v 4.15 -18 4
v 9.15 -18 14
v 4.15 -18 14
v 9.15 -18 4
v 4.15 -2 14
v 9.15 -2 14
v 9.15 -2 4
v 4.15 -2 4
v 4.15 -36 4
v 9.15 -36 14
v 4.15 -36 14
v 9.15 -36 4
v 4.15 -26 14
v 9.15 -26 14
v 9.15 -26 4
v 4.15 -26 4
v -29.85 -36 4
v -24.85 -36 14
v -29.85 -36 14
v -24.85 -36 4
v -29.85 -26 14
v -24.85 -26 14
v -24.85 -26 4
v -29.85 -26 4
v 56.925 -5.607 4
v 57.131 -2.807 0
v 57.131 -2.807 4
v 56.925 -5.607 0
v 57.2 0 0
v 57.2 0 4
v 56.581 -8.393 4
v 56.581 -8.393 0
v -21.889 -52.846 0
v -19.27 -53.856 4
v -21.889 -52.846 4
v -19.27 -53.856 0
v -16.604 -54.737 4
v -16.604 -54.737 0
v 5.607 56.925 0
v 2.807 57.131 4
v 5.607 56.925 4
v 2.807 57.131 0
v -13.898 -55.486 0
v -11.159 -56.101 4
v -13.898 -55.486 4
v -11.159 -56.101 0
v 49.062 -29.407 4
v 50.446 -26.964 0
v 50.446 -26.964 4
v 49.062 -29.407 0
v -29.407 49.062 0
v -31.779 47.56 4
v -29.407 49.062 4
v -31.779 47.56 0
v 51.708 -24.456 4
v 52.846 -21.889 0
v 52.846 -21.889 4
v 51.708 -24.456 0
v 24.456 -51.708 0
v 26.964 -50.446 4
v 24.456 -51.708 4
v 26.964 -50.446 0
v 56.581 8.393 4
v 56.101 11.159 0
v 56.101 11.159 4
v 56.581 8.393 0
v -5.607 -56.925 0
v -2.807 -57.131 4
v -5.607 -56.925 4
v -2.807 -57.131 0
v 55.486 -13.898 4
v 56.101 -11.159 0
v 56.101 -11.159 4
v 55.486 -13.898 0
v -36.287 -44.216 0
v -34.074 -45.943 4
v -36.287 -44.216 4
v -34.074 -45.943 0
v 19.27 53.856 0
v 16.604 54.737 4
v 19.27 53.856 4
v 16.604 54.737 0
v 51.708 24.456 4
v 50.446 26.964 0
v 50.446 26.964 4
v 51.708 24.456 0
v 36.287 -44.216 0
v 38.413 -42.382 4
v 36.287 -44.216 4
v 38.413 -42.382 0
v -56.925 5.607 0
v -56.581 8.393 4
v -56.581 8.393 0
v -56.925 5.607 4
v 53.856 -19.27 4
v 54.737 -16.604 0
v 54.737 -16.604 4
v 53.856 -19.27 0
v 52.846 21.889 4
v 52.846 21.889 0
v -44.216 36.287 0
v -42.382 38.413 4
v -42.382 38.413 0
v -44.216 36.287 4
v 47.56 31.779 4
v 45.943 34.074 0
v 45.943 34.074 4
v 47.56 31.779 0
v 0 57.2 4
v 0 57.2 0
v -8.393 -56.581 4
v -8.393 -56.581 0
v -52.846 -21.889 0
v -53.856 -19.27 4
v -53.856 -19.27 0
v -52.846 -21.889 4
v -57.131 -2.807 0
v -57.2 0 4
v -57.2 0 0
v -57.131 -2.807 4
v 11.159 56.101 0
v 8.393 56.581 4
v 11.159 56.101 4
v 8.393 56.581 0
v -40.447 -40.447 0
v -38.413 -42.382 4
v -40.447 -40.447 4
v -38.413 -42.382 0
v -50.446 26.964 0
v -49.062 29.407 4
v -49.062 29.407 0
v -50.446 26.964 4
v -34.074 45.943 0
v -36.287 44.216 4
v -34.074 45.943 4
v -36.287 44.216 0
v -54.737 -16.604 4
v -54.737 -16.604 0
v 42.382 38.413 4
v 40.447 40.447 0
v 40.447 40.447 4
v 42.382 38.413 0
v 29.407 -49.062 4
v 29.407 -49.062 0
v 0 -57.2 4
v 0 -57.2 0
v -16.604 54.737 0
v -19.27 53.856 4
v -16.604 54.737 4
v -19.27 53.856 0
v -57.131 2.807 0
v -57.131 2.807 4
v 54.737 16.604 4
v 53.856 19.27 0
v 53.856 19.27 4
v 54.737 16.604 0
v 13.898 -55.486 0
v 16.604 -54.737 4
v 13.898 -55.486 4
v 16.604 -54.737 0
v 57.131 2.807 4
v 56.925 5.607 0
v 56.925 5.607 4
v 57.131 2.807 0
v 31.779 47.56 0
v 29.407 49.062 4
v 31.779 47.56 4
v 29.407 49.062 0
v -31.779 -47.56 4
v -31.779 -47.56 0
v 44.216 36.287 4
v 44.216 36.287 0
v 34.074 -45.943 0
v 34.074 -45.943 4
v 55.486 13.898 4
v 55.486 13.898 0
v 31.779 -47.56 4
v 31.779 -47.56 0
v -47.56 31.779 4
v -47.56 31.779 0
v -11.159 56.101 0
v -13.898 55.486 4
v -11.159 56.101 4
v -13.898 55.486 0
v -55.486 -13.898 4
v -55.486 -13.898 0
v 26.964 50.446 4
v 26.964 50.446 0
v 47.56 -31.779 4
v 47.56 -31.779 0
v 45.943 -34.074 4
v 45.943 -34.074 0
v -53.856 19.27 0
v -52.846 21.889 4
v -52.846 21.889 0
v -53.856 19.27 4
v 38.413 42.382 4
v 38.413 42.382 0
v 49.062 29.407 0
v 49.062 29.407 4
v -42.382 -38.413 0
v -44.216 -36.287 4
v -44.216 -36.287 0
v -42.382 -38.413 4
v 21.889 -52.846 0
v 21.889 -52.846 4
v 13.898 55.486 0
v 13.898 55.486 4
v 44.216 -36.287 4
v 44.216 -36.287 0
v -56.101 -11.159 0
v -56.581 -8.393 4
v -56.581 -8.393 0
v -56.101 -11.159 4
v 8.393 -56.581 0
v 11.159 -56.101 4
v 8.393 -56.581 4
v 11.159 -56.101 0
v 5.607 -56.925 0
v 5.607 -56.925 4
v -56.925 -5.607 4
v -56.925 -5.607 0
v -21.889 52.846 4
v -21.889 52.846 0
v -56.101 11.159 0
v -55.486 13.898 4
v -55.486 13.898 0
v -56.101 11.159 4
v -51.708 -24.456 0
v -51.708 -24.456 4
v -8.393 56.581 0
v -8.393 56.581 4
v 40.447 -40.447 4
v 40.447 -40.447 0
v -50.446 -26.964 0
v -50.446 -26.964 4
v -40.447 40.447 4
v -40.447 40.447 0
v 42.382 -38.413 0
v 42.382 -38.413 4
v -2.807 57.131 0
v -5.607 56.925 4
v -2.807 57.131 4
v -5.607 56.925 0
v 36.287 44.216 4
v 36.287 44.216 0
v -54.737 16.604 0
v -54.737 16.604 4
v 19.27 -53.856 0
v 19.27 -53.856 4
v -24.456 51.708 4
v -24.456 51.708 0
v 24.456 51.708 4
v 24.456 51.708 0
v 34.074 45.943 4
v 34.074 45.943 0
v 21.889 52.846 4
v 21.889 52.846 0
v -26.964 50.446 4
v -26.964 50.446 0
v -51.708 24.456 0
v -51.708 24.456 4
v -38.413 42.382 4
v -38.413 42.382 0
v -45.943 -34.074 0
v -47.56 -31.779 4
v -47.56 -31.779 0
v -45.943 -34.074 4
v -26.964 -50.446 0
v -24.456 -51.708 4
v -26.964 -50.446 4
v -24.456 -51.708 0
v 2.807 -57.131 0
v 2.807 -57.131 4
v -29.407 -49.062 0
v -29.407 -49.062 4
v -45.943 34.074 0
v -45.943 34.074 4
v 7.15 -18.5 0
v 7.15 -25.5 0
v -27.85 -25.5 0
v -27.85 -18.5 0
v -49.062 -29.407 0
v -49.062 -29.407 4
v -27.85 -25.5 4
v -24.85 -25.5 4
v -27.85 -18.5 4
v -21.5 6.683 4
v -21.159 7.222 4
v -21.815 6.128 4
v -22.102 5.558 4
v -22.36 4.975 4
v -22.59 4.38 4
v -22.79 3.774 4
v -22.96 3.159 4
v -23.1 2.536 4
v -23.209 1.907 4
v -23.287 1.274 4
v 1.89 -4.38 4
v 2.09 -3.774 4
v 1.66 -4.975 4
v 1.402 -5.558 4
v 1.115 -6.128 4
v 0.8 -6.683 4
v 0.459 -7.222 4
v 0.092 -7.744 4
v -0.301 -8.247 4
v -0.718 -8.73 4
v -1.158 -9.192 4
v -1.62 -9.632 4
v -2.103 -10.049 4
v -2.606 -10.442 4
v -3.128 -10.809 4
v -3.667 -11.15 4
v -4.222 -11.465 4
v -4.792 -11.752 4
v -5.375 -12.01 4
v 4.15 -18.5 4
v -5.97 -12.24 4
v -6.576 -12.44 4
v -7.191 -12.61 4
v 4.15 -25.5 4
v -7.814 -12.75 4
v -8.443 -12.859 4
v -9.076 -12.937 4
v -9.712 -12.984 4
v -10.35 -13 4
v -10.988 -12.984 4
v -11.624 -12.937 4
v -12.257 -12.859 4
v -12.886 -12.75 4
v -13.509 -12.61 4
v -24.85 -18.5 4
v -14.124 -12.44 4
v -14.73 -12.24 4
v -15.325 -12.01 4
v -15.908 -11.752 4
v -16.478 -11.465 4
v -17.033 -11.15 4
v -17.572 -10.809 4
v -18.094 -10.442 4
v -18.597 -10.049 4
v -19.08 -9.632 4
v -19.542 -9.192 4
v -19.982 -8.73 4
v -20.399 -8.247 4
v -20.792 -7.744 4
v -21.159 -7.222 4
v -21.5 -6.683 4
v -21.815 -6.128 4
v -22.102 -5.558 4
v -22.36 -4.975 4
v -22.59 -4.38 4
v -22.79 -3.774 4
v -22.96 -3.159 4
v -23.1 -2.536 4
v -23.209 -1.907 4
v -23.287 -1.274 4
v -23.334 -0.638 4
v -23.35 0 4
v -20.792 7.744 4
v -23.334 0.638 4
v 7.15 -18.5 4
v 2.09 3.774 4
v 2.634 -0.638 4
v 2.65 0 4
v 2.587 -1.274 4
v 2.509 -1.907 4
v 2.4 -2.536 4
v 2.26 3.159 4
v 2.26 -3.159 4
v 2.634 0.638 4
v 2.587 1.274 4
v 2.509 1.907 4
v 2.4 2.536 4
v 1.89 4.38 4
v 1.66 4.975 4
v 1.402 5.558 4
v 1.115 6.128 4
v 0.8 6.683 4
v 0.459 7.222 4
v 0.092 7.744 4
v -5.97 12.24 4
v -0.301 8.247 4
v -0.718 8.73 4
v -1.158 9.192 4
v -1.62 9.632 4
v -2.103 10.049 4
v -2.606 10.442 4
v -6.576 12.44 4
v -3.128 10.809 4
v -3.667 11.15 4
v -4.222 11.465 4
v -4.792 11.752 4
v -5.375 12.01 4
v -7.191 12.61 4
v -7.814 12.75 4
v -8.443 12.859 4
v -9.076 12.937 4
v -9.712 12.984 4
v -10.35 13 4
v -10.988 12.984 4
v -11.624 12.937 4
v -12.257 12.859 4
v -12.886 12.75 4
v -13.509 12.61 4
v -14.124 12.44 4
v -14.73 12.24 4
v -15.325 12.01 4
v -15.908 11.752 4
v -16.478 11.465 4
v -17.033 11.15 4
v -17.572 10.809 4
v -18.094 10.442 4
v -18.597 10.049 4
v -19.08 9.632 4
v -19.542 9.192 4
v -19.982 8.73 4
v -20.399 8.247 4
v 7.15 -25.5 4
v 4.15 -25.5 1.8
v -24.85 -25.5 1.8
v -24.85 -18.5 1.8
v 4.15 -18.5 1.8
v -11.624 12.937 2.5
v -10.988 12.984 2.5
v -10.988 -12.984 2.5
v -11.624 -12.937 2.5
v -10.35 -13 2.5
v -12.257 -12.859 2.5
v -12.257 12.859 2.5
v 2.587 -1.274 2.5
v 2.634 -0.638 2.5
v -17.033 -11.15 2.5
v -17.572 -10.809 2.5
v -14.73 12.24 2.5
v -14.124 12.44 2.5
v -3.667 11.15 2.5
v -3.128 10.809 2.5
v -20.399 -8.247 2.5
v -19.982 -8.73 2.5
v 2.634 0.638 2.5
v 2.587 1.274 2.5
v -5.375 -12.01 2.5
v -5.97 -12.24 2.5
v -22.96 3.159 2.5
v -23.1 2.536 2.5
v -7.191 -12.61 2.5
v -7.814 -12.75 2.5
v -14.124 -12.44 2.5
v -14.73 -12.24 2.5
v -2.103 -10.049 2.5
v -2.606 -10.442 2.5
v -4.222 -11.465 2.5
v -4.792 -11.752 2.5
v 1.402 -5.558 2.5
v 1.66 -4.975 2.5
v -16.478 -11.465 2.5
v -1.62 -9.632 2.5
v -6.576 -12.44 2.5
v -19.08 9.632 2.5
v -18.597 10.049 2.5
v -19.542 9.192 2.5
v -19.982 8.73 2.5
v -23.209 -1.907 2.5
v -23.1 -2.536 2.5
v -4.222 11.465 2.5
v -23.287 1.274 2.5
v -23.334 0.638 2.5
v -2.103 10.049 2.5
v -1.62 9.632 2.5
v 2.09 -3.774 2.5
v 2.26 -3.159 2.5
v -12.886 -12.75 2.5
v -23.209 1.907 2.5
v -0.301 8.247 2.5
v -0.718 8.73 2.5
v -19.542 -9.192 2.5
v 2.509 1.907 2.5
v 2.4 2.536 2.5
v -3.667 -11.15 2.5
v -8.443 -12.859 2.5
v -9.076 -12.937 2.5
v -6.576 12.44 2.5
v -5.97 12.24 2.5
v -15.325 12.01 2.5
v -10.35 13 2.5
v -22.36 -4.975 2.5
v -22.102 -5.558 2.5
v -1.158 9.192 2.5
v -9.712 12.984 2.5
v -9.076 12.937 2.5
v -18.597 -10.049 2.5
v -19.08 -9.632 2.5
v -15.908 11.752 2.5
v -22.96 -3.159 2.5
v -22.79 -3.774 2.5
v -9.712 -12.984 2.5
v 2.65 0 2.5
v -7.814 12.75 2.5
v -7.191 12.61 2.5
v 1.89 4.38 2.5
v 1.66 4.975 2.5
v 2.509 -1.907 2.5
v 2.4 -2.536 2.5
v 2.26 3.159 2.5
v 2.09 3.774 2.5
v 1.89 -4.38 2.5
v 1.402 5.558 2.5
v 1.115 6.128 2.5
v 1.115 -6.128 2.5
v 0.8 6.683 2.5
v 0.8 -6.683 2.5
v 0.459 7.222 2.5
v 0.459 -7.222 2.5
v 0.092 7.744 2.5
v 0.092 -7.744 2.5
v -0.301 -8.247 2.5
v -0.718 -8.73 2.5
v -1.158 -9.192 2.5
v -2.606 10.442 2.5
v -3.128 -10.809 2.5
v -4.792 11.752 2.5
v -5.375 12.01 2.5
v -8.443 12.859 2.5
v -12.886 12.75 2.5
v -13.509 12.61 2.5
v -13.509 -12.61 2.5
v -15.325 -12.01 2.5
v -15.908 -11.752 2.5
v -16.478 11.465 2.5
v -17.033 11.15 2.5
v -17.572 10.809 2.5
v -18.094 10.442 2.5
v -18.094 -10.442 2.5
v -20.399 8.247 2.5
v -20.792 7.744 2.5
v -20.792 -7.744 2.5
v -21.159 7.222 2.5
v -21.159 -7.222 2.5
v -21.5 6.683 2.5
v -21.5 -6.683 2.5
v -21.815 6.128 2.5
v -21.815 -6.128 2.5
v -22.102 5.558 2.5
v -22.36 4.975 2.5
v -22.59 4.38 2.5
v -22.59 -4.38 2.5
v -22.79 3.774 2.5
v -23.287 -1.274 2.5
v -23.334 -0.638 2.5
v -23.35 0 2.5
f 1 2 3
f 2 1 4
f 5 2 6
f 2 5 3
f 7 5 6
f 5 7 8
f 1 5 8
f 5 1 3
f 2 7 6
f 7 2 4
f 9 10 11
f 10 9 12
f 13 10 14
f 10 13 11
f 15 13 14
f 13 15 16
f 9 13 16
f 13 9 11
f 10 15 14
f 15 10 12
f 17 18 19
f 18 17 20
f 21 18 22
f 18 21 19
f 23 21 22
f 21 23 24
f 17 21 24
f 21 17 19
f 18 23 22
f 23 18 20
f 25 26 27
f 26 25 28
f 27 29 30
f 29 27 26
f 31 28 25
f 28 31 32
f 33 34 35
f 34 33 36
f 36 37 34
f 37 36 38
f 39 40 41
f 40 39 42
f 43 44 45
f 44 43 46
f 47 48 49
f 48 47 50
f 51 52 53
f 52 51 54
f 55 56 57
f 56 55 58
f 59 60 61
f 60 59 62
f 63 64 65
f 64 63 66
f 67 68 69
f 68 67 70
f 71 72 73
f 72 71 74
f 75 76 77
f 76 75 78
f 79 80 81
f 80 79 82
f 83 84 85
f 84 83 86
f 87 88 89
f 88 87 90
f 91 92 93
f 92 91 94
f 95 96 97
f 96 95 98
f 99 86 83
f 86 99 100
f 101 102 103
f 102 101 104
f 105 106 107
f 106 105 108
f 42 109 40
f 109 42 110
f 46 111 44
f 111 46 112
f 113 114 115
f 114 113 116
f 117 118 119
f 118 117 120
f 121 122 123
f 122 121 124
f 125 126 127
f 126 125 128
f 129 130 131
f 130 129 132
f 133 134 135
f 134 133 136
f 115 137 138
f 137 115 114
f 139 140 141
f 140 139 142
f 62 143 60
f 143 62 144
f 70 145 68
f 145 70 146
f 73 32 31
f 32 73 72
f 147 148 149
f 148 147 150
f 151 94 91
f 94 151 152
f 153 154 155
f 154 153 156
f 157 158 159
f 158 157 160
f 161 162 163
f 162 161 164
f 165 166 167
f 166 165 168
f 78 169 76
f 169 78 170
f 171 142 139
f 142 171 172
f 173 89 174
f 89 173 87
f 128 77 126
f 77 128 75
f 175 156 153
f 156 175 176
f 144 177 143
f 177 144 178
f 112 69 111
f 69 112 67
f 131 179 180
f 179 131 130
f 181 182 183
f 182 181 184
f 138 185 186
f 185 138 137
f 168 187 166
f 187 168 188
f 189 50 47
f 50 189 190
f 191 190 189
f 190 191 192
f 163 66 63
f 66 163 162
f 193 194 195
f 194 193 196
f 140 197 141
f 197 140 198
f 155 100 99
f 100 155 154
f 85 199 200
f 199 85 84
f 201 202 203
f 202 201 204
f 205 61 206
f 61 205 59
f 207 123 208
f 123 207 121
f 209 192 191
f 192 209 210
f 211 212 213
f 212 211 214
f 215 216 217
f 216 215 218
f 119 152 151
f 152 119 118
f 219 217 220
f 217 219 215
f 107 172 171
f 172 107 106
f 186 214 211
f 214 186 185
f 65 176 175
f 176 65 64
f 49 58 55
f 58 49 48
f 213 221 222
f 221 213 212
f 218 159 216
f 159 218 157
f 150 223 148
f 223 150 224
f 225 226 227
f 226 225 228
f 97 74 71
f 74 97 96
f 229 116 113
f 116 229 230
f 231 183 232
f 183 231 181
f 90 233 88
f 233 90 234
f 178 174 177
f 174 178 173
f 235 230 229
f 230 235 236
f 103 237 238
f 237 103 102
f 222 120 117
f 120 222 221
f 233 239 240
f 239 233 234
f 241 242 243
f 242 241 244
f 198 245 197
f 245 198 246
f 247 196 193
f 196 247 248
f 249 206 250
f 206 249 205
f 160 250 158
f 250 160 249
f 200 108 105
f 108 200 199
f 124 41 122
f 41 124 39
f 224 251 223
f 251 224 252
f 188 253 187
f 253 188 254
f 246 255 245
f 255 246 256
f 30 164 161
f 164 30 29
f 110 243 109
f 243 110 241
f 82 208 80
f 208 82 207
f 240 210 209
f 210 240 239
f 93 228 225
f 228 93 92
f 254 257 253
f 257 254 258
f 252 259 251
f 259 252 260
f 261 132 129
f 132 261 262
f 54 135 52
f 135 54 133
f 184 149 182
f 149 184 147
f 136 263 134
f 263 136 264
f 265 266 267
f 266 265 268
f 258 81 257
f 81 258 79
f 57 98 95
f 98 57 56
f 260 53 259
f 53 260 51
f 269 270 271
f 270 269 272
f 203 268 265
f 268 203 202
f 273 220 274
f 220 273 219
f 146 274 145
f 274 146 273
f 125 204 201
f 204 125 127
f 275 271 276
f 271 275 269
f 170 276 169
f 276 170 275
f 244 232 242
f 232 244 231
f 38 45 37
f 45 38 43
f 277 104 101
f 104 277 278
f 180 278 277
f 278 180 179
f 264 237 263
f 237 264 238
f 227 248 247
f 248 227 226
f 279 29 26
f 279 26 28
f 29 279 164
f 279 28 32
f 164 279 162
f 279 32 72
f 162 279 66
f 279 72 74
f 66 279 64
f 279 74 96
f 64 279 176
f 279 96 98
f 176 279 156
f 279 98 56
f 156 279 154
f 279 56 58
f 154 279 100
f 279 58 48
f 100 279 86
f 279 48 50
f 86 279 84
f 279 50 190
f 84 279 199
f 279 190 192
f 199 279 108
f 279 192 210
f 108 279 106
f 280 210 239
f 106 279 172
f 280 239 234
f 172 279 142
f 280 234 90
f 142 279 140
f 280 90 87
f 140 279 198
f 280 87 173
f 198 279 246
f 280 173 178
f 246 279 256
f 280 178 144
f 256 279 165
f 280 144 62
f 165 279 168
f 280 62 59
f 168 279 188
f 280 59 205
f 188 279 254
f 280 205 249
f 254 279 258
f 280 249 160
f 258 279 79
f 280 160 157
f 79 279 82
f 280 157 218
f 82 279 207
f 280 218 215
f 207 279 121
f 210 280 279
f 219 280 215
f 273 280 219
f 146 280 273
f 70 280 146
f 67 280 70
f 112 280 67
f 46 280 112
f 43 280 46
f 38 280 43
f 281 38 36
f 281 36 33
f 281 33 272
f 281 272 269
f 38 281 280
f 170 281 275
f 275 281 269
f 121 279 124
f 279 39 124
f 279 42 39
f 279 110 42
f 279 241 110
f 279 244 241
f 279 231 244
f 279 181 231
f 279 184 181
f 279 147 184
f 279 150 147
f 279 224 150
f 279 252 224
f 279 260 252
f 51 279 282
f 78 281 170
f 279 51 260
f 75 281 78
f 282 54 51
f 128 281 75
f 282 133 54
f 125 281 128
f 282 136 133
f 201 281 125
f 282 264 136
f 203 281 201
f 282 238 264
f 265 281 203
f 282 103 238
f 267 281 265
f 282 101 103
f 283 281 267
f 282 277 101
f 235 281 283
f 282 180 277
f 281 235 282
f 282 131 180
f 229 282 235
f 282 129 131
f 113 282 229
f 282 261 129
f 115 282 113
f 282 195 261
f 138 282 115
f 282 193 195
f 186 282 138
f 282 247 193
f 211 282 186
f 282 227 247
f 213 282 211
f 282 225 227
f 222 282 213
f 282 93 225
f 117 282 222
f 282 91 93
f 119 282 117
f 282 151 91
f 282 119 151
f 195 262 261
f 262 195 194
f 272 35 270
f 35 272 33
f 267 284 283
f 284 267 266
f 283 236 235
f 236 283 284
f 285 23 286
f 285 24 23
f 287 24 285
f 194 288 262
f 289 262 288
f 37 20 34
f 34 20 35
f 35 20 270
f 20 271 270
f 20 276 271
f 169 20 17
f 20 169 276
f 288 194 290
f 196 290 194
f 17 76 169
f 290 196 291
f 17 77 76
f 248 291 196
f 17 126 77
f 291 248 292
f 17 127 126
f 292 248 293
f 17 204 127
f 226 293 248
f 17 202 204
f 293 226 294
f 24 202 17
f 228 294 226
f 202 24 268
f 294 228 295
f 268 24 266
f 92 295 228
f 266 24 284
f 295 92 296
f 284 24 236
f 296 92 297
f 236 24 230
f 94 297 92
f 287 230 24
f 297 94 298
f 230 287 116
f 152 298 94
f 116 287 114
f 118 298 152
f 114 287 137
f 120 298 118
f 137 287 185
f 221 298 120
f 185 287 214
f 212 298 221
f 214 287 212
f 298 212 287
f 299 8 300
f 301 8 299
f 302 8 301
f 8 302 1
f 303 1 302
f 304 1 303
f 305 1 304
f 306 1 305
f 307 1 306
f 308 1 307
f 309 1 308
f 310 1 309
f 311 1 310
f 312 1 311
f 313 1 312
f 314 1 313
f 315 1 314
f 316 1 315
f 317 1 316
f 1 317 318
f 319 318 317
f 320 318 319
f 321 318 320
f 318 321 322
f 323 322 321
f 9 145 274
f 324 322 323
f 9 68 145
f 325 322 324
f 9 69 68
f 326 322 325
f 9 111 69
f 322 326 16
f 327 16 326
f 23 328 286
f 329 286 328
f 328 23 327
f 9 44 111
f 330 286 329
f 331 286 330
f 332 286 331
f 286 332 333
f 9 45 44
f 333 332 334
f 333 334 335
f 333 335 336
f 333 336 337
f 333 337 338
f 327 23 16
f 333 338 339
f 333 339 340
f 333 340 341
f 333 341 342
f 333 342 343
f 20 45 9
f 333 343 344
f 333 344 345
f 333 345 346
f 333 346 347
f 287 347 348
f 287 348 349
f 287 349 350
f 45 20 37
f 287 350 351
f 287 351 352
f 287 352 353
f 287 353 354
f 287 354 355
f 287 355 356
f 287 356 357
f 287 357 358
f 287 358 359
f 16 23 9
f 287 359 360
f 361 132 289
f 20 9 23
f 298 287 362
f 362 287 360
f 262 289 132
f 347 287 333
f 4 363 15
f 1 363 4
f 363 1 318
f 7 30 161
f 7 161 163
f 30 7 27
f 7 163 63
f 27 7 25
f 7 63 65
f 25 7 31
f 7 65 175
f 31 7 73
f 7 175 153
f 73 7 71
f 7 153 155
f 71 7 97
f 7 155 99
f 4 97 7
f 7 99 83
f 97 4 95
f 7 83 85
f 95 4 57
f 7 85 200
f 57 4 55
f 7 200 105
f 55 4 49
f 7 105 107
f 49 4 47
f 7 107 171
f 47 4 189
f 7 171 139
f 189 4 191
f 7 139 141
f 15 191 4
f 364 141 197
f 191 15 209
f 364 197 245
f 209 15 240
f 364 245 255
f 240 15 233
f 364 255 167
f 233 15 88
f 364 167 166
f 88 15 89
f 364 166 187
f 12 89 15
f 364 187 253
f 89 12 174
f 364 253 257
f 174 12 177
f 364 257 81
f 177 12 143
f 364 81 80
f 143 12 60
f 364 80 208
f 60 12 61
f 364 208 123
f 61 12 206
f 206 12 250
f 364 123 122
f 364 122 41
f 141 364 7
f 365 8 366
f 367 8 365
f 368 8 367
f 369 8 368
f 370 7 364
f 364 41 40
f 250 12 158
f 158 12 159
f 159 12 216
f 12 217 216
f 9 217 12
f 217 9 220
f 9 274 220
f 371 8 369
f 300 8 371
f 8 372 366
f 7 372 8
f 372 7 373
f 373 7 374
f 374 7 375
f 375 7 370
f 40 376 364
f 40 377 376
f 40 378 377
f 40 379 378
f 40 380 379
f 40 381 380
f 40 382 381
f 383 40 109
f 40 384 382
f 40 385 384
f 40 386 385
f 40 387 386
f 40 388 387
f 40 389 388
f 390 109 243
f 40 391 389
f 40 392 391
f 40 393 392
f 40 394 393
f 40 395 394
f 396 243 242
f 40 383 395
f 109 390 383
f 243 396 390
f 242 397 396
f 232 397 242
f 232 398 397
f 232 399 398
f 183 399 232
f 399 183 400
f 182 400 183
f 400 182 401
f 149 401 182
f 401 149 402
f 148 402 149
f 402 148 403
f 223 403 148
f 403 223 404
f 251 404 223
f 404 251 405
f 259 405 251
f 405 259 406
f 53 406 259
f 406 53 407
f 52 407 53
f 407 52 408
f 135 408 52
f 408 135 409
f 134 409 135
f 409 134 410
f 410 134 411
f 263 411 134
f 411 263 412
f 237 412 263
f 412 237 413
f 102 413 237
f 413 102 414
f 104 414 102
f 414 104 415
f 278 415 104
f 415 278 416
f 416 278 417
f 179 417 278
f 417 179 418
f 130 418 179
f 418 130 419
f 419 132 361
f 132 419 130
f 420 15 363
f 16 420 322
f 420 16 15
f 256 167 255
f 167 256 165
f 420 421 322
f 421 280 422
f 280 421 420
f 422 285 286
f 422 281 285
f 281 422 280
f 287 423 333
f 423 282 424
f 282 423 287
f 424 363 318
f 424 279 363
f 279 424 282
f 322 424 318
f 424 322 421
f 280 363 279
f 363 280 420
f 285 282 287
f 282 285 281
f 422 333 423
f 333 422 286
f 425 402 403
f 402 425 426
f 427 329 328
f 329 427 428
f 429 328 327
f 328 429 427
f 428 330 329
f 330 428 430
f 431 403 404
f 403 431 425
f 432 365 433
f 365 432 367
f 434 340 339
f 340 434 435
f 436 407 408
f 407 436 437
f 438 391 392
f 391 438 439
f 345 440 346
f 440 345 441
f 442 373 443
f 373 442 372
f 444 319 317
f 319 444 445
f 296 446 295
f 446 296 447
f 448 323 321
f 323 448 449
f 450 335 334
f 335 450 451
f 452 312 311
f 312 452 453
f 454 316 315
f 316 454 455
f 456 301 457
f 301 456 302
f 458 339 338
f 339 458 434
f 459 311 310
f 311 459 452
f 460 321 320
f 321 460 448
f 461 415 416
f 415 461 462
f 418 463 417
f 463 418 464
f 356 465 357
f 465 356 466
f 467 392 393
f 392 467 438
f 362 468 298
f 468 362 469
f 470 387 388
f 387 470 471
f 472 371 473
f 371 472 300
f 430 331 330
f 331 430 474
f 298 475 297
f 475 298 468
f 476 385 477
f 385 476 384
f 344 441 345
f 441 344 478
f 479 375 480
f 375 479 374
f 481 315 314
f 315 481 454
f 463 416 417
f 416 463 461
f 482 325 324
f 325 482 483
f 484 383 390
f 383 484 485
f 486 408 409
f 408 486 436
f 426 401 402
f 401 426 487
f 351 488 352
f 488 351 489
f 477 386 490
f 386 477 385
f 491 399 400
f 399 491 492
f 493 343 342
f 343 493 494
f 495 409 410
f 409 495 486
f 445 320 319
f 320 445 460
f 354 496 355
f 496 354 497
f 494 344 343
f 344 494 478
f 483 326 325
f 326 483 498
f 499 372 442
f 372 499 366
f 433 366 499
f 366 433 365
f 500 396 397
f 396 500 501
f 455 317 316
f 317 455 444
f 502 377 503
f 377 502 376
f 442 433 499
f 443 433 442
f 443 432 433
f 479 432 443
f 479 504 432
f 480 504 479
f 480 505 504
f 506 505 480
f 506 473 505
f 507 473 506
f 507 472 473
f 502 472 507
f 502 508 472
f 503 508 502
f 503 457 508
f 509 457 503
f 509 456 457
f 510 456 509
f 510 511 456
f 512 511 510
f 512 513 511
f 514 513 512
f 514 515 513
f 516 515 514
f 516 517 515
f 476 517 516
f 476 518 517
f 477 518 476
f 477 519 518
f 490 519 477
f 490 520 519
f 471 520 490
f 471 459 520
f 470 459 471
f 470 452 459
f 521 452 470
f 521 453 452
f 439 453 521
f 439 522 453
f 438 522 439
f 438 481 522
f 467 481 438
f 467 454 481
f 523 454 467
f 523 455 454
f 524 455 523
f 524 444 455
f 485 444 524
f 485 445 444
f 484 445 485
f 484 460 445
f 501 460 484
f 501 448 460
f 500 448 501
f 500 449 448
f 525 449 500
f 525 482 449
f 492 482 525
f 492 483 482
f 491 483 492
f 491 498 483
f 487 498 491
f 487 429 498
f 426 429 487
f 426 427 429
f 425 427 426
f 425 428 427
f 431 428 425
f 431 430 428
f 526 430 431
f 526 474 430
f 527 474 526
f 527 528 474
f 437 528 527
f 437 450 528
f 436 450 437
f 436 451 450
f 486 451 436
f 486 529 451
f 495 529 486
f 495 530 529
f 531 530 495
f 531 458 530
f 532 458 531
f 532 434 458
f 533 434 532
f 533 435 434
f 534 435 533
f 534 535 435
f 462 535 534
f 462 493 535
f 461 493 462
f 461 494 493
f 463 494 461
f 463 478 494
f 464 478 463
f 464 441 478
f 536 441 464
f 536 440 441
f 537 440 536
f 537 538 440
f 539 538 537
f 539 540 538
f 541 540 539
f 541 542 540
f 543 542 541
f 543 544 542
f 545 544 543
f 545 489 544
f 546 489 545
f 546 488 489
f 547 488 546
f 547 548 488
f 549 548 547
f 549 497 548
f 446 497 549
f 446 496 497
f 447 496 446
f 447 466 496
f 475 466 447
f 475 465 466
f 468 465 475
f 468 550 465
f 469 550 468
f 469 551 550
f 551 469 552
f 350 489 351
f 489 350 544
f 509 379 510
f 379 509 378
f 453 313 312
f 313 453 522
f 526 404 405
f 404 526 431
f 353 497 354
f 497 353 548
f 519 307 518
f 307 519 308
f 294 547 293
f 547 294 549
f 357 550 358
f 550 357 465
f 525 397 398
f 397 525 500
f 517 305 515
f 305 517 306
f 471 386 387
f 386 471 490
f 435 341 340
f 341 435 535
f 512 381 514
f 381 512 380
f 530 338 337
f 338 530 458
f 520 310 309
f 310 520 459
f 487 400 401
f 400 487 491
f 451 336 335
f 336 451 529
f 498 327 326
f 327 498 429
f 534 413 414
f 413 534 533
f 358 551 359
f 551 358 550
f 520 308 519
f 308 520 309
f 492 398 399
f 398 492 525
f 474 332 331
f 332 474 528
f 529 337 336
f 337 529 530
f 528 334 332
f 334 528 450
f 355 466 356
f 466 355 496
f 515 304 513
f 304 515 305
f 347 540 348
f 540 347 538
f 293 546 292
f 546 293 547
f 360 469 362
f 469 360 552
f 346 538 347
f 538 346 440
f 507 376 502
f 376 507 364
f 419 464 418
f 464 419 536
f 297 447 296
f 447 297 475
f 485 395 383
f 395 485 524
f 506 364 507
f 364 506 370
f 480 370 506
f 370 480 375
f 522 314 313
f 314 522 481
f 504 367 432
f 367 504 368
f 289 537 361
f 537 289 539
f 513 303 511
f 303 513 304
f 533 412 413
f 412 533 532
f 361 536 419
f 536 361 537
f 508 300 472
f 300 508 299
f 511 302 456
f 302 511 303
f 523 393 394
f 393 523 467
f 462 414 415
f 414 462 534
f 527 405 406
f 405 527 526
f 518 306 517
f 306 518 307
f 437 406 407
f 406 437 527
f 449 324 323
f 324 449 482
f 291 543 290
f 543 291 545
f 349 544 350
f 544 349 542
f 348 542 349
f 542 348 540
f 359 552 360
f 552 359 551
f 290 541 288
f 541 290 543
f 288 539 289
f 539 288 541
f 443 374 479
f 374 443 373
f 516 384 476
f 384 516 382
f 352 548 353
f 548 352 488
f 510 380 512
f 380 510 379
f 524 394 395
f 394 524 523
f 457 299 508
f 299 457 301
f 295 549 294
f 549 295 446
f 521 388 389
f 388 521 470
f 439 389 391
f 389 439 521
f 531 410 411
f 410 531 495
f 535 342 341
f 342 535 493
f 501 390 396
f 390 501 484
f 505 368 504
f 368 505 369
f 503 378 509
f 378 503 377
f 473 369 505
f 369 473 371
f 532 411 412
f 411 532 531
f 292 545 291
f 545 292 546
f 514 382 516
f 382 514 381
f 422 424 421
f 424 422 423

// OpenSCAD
// Platform for a TP-Link Deco (110 mm cylinder) on top of the swivel
// knuckle of a monitor arm, next to the VESA head.
//
// Two printed pieces:
//   tray  a round floor that lies on the flat top of the knuckle. Two
//         split cheeks reach down beside the knuckle and stop the tray
//         from turning or sliding. One cable tie goes through two
//         slots in the floor, in the gap of the cheeks, and around the
//         knuckle; on the top face it lies in a groove under the Deco.
//   rim   a loose band dropped over the edge of the floor. A step in
//         its bore rests on the floor; above the floor it stands 6 mm
//         high around the Deco.
//
// Seen from above the arm is an L: the link from the VESA head meets
// the knuckle and the spring arm at 90 degrees (arm_angle).
//
// Model frame: +X away from the VESA plate, Y along the plate, Z up. The Deco stands on Z = 0 with its axis on the origin.
// The top of the knuckle is at Z = -floor_t.
//
// Both pieces print without supports: the tray upside down on its top
// face, the rim upside down on its upper edge.
//
// Build:  make deco-platform        (STLs and previews)
//         make deco-platform-fit    (small test piece of the saddle)
//         make deco-platform-save   (copy the STLs to models/)
// See specs/deco-arm-platform.md. The arm numbers are read from photos
// and must be checked with the fit piece.

/* [Deco] */
deco_d   = 110;     // diameter of the Deco
deco_h   = 114;     // preview only
deco_clr = 2;       // added to the diameter inside the rim

/* [Arm, estimated from photos] */
knuckle_w   = 28;   // width of the knuckle block across the arm
knuckle_clr = 1;    // added to the width between the cheeks
knuckle_len = 36;   // flat top from the pin axis to the end of the block, towards the spring arm
boss_d      = 24;   // cap of the swivel pin on top of the knuckle
boss_h      = 1.5;  // how far the cap stands above the flat top
boss_clr    = 2;    // added to the pocket diameter
pin_to_plate = 51;  // pin axis to the face of the VESA plate
// Angle in plan between the knuckle (towards the spring arm) and the
// direction away from the plate: 90 = spring arm to the right seen
// from behind the plate, -90 = to the left, 0 = straight.
arm_angle   = 90;
plate_gap   = 2;    // air between the rim and the plate

/* [Tray] */
floor_t  = 4;       // floor thickness
step     = 1.2;     // floor edge outside the Deco bore; the rim rests on it
cheek_t  = 5;       // cheek thickness
cheek_h  = 10;      // cheek height below the floor
cheek_x0 = 2;       // cheeks start this far from the pin axis, along the knuckle

/* [Cable tie] */
tie_x    = 22;      // tie position, from the pin axis along the knuckle
tie_w    = 7;       // slot length along the knuckle (tie up to 5 mm wide)
tie_t    = 3;       // slot width across the knuckle
groove_d = 1.8;     // groove for the tie in the top face

/* [Rim] */
rim_h     = 6;      // height above the floor
band_wall = 2;      // wall of the band around the floor edge
band_clr  = 0.3;    // added to the bore around the floor edge

/* [Output] */
// "tray", "rim", "fit" (print these), or a preview: "assembly", "side", "below"
part = "tray";

$fn = 128;
eps = 0.01;

tray_d  = deco_d + deco_clr;                  // bore of the rim above the floor
disc_d  = tray_d + 2 * step;                  // floor disc
band_od = disc_d + band_clr + 2 * band_wall;
w_in    = knuckle_w + knuckle_clr;            // clear width between the cheeks
// The tray is pushed away from the plate until the rim clears it.
tray_off = max(0, band_od / 2 + plate_gap - pin_to_plate);
pin_x   = -tray_off;                          // pin axis in the model frame
// Along the knuckle, measured from the pin axis.
seg1 = [cheek_x0, tie_x - tie_w / 2 - 0.5];
seg2 = [tie_x + tie_w / 2 + 0.5, knuckle_len];
// The cheek on the plate side has no front segment: under it the link
// to the VESA head leaves the knuckle.
inner = arm_angle > 0 ? 1 : arm_angle < 0 ? 0 : -1;

function sad(p) = [pin_x + p[0] * cos(arm_angle) - p[1] * sin(arm_angle),
                   p[0] * sin(arm_angle) + p[1] * cos(arm_angle)];

assert(seg1[1] - seg1[0] >= 6, "front cheek segment under 6 mm; move tie_x away from the pin");
assert(seg2[1] - seg2[0] >= 6, "rear cheek segment under 6 mm; move tie_x towards the pin");
assert(boss_h < floor_t - 1.6, "boss pocket leaves under 1.6 mm of floor");
assert(groove_d < floor_t - 1.6, "tie groove leaves under 1.6 mm of floor");
assert(tie_x - tie_w / 2 > (boss_d + boss_clr) / 2 + 1, "tie groove runs over the boss pocket");
assert(max([for (x = [seg1[0], seg2[1]], y = [-1, 1]) norm(sad([x, y * (w_in / 2 + cheek_t)]))])
       < disc_d / 2 - 1, "cheeks reach the edge of the floor");

// Saddle frame: pin axis on the origin, X along the knuckle.
module saddle_frame() {
    translate([pin_x, 0, 0]) rotate(arm_angle) children();
}

// Cheeks, pocket, slots and groove; shared by the tray and the fit piece.
module saddle_add() {
    saddle_frame()
        for (s = [0, 1], seg = (s == inner ? [seg2] : [seg1, seg2]))
            translate([seg[0], s ? w_in / 2 : -w_in / 2 - cheek_t, -floor_t - cheek_h])
                cube([seg[1] - seg[0], cheek_t, cheek_h + eps]);
}

module saddle_cut() {
    saddle_frame() {
        // pocket for the cap of the swivel pin
        translate([0, 0, -floor_t - eps]) cylinder(d = boss_d + boss_clr, h = boss_h + eps);
        // tie slots, right beside the knuckle
        for (s = [0, 1])
            translate([tie_x - tie_w / 2, s ? w_in / 2 : -w_in / 2 - tie_t, -floor_t - eps])
                cube([tie_w, tie_t, floor_t + 2 * eps]);
        // groove in the top face between the slots
        translate([tie_x - tie_w / 2, -w_in / 2 - tie_t, -groove_d])
            cube([tie_w, w_in + 2 * tie_t, groove_d + eps]);
    }
}

module tray() {
    difference() {
        union() {
            translate([0, 0, -floor_t]) cylinder(d = disc_d, h = floor_t);
            saddle_add();
        }
        saddle_cut();
    }
}

// Test piece: the saddle on a small plate instead of the full floor.
module fit() {
    m = 4;
    difference() {
        union() {
            saddle_frame()
                translate([-boss_d / 2 - m, -w_in / 2 - cheek_t - m, -floor_t])
                    cube([knuckle_len + boss_d / 2 + 2 * m, w_in + 2 * cheek_t + 2 * m, floor_t]);
            saddle_add();
        }
        saddle_cut();
    }
}

module rim() {
    difference() {
        translate([0, 0, -floor_t]) cylinder(d = band_od, h = floor_t + rim_h);
        translate([0, 0, -floor_t - eps]) cylinder(d = disc_d + band_clr, h = floor_t + eps);
        translate([0, 0, -eps]) cylinder(d = tray_d, h = rim_h + 2 * eps);
    }
}

module arm() {
    zt = -floor_t;                            // top of the knuckle
    color("DimGray") {
        saddle_frame() {
            translate([0, -knuckle_w / 2, zt - 45]) cube([knuckle_len, knuckle_w, 45]);
            translate([0, 0, zt - 45]) cylinder(d = knuckle_w, h = 45);
            translate([0, 0, zt]) cylinder(d = boss_d, h = boss_h);
            // spring arm
            translate([knuckle_len, 0, zt - 22]) rotate([0, 125, 0])
                translate([-12, -15, 0]) cube([24, 30, 120]);
        }
        // link to the VESA head
        translate([pin_x - pin_to_plate + 4, -11, zt - 34]) cube([pin_to_plate - 4, 22, 22]);
    }
    color("Red") translate([pin_x - pin_to_plate - 4, -65, zt - 110]) cube([4, 130, 170]);
}

module assembly() {
    color("Orange") tray();
    color("Gold") rim();
    color("White", 0.6) cylinder(d = deco_d, h = deco_h);
    arm();
}

if (part == "tray") {
    rotate([180, 0, 0]) tray();
} else if (part == "rim") {
    translate([0, 0, rim_h]) rotate([180, 0, 0]) rim();
} else if (part == "fit") {
    rotate([180, 0, 0]) fit();
} else if (part == "assembly" || part == "side") {
    assembly();
} else if (part == "below") {
    color("Orange") tray();
    color("Gold") rim();
} else {
    assert(false, "unknown part");
}
